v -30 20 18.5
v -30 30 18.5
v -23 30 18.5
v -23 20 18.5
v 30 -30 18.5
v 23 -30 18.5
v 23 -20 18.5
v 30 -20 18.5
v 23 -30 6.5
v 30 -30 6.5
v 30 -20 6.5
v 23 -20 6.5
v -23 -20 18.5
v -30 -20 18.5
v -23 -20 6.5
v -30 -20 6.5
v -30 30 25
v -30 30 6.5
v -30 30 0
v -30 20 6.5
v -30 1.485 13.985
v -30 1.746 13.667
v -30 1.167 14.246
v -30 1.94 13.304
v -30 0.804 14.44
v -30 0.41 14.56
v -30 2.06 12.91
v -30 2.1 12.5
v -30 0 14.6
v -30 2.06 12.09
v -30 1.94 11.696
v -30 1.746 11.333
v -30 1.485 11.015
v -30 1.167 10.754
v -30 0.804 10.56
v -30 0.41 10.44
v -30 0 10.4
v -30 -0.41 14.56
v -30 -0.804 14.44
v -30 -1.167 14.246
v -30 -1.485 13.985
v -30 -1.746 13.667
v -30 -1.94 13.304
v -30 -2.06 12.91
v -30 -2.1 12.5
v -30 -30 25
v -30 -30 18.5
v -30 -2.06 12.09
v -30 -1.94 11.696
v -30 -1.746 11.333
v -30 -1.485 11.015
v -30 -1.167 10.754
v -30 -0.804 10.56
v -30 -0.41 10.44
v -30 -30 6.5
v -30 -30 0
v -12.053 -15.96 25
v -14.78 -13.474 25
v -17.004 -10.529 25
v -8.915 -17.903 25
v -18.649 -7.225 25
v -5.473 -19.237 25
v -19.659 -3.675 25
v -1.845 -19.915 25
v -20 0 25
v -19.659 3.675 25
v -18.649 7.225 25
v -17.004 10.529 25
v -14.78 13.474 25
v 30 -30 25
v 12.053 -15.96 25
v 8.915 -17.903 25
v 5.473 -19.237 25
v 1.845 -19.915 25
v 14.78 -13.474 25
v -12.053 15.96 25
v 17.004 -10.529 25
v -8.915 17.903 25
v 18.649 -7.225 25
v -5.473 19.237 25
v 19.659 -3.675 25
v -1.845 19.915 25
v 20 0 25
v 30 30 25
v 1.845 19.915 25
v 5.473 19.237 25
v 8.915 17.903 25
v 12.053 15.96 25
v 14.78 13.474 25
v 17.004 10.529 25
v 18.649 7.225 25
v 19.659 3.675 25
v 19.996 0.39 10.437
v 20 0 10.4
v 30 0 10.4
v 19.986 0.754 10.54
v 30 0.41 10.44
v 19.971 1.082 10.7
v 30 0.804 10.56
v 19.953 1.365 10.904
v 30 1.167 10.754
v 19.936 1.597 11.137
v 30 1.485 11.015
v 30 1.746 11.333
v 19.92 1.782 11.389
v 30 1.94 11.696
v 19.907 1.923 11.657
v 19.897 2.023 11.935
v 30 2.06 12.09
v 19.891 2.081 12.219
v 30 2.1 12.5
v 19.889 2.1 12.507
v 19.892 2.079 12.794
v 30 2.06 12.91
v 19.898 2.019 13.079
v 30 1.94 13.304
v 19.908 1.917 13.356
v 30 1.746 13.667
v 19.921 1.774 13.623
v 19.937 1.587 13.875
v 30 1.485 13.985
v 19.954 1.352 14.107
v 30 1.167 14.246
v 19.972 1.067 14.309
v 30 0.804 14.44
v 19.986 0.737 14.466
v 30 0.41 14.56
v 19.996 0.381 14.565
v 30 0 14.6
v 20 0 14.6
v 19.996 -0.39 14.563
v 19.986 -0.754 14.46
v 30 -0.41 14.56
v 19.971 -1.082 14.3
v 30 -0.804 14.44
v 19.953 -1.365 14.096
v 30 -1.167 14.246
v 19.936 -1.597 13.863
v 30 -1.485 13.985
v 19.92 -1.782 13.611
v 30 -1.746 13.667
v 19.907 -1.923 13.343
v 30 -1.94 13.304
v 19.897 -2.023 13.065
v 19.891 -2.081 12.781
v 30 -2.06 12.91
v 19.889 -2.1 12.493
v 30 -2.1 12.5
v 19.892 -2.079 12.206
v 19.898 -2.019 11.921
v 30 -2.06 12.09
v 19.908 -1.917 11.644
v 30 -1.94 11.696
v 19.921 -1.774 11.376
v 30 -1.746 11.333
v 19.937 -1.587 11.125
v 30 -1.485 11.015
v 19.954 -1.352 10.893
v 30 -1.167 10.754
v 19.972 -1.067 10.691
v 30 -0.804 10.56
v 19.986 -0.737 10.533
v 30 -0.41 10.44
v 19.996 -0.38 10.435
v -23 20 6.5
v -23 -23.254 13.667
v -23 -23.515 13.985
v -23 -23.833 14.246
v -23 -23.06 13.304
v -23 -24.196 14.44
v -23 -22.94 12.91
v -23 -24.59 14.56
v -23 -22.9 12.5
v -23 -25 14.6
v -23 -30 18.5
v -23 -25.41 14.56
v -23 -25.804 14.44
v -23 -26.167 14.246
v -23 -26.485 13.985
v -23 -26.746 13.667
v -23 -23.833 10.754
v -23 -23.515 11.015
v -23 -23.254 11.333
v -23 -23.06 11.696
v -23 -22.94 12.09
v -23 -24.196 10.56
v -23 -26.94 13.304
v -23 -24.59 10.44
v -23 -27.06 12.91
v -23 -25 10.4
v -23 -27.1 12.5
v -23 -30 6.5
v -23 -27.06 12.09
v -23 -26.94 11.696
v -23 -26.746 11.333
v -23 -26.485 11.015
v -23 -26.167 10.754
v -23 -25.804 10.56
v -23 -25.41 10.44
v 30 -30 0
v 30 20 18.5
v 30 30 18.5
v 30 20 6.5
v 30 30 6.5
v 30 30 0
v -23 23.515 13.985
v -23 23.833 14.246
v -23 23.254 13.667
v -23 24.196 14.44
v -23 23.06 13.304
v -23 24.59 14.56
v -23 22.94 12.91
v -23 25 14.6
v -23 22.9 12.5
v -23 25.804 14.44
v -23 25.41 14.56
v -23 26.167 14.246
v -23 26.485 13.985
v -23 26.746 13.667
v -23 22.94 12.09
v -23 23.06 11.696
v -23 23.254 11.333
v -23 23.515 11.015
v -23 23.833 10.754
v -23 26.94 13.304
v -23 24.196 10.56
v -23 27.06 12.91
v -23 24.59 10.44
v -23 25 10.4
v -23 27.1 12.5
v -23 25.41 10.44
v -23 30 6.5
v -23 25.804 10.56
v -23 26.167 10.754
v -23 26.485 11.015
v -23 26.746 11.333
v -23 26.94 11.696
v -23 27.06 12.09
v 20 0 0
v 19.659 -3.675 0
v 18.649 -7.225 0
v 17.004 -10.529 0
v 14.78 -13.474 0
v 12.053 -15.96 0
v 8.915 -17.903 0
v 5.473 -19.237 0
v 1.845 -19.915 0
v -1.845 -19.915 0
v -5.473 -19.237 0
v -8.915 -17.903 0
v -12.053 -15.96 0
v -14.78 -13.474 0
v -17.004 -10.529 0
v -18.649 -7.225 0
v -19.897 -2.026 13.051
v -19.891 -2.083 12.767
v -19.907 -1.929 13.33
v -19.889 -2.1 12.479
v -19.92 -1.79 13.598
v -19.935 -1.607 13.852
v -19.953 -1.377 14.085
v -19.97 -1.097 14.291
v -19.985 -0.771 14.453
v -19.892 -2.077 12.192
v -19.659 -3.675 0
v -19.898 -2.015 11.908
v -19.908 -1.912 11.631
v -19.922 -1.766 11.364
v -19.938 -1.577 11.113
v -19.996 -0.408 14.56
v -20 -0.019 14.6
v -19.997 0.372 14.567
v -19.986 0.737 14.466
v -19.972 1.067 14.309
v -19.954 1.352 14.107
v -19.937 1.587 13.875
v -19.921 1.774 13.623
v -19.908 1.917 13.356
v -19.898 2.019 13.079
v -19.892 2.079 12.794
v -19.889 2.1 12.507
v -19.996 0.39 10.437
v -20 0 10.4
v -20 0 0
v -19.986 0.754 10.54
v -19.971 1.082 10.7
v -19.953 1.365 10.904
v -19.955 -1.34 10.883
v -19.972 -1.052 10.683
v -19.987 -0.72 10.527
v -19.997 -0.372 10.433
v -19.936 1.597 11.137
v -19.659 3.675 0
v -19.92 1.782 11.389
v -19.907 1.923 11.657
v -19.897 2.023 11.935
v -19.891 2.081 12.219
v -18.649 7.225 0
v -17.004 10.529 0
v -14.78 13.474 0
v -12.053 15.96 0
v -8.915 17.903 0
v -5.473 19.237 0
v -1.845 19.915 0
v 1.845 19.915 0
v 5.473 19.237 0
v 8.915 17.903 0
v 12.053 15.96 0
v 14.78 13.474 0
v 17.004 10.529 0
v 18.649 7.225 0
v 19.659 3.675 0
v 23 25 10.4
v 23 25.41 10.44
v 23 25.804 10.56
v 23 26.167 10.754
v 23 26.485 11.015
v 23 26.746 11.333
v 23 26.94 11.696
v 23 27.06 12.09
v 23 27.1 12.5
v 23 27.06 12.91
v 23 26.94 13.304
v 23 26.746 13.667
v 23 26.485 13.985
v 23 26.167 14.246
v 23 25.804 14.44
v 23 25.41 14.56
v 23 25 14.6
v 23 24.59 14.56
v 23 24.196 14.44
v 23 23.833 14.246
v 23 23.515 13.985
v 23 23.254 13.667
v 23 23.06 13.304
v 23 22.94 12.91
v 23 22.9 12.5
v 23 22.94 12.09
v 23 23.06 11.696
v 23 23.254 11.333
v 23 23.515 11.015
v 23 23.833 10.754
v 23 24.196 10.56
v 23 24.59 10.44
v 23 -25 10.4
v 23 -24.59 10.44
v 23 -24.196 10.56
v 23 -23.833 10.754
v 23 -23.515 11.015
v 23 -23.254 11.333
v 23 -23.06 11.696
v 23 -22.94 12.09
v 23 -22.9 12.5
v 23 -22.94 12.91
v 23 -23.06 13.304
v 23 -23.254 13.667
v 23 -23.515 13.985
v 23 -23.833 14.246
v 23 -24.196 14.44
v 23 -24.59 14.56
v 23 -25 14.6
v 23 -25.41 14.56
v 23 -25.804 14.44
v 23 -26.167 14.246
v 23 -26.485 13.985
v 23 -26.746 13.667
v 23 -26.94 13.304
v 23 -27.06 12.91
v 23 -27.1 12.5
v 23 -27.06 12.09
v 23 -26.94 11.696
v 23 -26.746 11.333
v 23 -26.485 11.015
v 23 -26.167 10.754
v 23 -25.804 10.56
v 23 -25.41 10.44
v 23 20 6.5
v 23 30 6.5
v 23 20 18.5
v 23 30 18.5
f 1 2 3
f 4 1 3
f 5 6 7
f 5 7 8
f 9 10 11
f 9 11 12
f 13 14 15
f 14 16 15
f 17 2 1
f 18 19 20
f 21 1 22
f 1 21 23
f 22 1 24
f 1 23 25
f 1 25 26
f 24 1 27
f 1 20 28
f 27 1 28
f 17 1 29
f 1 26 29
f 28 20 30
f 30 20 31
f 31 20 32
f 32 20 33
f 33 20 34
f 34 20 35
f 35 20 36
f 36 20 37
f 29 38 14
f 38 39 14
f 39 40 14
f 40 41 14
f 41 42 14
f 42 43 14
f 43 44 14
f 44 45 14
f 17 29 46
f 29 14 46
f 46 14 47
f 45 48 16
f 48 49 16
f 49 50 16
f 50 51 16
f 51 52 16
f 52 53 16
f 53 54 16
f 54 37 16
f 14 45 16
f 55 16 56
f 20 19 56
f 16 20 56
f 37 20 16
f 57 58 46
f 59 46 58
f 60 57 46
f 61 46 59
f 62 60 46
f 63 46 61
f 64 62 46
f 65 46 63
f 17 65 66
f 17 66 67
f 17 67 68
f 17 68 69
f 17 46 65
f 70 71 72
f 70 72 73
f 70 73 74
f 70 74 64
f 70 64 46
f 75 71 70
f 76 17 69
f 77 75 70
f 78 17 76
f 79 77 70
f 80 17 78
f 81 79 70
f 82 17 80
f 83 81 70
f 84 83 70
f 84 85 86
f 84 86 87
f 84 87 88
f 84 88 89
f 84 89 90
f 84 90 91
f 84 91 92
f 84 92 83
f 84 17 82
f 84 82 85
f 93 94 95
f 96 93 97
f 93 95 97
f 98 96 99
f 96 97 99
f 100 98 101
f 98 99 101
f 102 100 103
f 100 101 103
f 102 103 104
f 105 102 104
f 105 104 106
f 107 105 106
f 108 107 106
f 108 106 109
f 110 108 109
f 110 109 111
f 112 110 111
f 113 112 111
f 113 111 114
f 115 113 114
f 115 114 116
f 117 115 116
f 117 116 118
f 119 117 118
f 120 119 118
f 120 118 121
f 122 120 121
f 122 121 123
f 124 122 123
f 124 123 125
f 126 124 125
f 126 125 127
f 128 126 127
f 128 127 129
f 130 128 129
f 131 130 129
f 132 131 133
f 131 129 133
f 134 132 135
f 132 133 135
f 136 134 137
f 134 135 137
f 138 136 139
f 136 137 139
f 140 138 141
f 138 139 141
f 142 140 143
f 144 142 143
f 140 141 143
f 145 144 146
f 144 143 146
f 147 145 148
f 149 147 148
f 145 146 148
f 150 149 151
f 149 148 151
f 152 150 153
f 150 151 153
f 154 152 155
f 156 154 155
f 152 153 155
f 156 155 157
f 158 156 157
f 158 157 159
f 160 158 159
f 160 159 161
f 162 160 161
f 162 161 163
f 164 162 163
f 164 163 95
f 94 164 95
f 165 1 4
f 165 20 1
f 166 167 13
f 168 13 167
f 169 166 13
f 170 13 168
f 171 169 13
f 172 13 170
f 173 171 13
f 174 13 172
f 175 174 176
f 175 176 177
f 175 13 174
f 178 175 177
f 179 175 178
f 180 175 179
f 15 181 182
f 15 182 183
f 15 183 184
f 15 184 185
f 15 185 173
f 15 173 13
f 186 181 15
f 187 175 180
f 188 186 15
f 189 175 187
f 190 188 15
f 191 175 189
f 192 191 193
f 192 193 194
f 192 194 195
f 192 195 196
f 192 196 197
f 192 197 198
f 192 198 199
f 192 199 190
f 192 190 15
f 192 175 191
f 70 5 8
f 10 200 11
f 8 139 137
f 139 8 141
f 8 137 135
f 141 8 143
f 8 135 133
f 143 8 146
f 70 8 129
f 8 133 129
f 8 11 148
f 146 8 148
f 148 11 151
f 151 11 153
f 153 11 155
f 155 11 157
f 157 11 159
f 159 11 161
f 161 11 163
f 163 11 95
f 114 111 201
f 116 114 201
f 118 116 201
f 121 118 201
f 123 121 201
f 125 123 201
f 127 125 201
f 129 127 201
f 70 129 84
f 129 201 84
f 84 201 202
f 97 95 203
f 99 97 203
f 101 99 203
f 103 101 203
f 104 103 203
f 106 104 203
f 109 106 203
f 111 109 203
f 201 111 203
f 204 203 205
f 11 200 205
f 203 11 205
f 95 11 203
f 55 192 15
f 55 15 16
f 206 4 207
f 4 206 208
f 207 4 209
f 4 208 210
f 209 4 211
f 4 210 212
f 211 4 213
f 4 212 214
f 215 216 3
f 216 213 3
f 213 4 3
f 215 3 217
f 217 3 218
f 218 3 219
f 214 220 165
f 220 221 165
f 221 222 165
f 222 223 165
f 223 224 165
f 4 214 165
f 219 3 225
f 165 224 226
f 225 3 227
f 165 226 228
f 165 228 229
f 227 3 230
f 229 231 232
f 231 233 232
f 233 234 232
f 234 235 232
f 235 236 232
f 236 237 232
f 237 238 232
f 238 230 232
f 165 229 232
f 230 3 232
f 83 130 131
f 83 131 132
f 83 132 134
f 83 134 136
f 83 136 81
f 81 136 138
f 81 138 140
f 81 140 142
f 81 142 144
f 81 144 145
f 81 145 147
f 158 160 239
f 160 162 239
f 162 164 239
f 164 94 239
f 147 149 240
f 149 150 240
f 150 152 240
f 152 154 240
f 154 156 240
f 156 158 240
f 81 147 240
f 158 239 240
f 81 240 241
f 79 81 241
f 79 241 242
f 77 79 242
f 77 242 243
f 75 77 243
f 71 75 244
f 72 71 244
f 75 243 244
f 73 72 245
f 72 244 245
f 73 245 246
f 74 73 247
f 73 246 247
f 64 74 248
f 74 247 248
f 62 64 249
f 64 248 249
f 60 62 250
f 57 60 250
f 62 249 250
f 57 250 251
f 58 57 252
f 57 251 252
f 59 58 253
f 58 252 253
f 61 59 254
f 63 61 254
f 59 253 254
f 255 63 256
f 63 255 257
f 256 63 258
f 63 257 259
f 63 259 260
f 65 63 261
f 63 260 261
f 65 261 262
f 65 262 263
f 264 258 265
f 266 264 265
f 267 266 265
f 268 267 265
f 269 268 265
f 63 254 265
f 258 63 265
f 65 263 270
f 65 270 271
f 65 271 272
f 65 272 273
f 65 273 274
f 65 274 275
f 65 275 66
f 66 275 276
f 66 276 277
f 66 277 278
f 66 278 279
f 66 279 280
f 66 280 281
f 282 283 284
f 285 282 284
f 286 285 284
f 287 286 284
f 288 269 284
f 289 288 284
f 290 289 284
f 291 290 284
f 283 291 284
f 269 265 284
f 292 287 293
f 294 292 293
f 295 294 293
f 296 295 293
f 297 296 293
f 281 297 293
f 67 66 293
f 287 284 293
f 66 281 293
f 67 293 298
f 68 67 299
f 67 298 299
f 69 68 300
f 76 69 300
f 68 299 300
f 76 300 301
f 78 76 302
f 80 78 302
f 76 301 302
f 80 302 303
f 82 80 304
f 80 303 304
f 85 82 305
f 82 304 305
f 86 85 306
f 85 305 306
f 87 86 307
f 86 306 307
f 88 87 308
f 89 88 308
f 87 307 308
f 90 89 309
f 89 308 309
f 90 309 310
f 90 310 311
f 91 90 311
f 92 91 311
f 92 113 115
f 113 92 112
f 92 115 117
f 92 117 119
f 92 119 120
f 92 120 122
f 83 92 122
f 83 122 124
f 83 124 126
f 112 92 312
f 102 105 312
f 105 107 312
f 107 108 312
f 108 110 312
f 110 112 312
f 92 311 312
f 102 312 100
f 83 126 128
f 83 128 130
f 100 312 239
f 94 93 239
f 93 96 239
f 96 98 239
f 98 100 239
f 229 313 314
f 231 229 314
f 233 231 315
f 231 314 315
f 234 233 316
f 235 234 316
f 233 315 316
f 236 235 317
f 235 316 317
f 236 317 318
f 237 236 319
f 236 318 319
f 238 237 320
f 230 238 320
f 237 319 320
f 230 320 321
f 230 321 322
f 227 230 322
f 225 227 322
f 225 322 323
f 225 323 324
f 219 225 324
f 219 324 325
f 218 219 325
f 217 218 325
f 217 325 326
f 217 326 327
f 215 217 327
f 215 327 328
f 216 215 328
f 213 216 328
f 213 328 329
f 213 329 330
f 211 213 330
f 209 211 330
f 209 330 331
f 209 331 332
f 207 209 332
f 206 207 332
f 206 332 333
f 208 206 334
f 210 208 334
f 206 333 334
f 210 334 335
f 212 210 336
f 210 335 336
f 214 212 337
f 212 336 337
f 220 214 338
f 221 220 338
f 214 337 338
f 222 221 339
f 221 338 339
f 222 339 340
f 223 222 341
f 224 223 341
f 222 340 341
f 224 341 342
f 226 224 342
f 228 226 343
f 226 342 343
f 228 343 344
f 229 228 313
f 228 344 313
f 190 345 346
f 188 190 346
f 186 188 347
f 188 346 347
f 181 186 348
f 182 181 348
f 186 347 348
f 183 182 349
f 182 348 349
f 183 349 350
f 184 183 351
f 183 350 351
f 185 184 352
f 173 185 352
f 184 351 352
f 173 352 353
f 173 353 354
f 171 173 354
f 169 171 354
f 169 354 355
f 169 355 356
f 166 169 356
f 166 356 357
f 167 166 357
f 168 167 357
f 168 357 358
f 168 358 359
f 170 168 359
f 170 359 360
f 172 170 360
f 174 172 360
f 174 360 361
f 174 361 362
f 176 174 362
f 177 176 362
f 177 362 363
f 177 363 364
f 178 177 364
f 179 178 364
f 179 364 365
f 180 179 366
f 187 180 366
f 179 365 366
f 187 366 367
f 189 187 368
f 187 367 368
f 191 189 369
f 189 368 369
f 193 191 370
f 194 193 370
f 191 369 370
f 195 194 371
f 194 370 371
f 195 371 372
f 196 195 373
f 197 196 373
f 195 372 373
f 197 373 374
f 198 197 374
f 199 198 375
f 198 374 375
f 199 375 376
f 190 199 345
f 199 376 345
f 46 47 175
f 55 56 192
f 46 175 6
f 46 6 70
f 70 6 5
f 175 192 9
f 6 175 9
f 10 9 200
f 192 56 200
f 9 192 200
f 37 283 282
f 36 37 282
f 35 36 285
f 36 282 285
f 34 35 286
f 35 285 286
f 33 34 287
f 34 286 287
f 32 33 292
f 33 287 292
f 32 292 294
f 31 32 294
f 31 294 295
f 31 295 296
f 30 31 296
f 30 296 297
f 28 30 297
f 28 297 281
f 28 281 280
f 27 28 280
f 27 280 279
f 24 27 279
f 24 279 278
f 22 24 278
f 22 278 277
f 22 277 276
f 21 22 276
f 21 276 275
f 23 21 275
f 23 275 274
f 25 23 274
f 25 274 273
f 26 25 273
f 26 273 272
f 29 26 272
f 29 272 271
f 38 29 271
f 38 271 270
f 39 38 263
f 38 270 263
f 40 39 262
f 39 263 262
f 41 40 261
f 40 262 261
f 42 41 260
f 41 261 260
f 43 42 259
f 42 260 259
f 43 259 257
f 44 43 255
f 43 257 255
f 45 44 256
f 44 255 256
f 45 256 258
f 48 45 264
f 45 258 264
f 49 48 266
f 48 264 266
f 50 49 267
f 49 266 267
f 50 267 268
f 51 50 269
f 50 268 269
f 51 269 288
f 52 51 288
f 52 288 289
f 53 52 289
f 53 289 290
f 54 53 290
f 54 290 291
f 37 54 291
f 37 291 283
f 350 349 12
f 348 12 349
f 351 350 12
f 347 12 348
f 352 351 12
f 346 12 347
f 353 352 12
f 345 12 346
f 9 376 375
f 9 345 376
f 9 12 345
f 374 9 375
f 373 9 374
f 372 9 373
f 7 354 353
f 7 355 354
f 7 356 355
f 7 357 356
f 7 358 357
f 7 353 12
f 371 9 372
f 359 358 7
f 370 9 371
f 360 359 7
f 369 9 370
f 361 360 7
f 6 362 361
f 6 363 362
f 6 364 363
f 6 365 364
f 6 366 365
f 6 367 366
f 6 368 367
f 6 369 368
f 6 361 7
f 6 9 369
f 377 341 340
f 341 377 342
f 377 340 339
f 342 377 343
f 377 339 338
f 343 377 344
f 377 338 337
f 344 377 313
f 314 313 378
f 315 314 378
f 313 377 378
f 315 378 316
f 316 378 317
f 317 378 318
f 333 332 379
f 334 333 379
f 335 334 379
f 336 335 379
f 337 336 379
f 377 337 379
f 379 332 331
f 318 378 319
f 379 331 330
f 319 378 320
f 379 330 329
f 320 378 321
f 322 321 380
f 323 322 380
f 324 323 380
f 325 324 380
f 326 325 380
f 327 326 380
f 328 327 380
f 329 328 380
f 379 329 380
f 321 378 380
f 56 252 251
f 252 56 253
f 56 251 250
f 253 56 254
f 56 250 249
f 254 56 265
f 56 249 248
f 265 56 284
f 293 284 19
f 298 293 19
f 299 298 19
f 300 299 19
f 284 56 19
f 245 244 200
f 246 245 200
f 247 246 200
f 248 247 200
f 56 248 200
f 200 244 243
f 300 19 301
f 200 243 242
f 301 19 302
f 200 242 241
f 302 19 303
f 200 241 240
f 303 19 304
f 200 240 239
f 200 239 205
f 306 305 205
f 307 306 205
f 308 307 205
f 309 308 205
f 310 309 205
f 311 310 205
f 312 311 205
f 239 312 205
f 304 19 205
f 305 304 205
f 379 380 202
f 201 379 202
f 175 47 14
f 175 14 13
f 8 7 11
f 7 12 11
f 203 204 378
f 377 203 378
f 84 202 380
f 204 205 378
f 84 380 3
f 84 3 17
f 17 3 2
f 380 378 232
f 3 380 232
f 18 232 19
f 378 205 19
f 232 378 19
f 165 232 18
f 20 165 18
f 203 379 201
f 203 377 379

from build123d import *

# Parameters (mm, degrees)
BOSS_EXTRUDE1_DEPTH = 25
SKETCH2_R           = 2.1
CUT_EXTRUDE1_DEPTH  = 72.589105316
CUT_EXTRUDE2_DEPTH  = 10


with BuildPart() as part:
    # Sketch1 → Boss-Extrude1 (new body)
    with BuildSketch(Plane.XY):
        with BuildLine():
            Line((-30, 0), (-20, 0))
            ThreePointArc((-20, 0), (0, 20), (20, 0))
            Line((20, 0), (30, 0))
            Line((30, 0), (30, 30))
            Line((30, 30), (-30, 30))
            Line((-30, 30), (-30, 0))
        make_face()
        with BuildLine():
            ThreePointArc((20, 0), (0, -20), (-20, 0))
            Line((-20, 0), (-30, 0))
            Line((-30, 0), (-30, -30))
            Line((-30, -30), (30, -30))
            Line((30, -30), (30, 0))
            Line((30, 0), (20, 0))
        make_face()
    extrude(amount=BOSS_EXTRUDE1_DEPTH)

    # Sketch2 → Cut-Extrude1 (cut, through all)
    with BuildSketch(Plane(origin=(30, 0, 0), x_dir=(0, 0, -1), z_dir=(1, 0, 0))):
        with Locations((-12.5, 25)):
            Circle(SKETCH2_R)
        with Locations((-12.5, -25)):
            Circle(SKETCH2_R)
        with Locations((-12.5, 0)):
            Circle(SKETCH2_R)
    extrude(amount=-CUT_EXTRUDE1_DEPTH, mode=Mode.SUBTRACT)

    # Sketch3 → Cut-Extrude2 (cut)
    with BuildSketch(Plane(origin=(0, 30, 0), x_dir=(1, 0, 0), z_dir=(0, 1, 0))):
        Polygon((-30, -18.5), (-23, -18.5), (-23, -15), (-23, -10), (-23, -6.5), (-30, -6.5), align=None)
        Polygon((23, -10), (23, -15), (23, -18.5), (30, -18.5), (30, -6.5), (23, -6.5), align=None)
    cut_extrude2 = extrude(amount=-CUT_EXTRUDE2_DEPTH, mode=Mode.SUBTRACT)

    # Mirror1: Cut-Extrude2 across plane
    add(cut_extrude2.mirror(Plane.ZX), mode=Mode.SUBTRACT)


solid = part.part
